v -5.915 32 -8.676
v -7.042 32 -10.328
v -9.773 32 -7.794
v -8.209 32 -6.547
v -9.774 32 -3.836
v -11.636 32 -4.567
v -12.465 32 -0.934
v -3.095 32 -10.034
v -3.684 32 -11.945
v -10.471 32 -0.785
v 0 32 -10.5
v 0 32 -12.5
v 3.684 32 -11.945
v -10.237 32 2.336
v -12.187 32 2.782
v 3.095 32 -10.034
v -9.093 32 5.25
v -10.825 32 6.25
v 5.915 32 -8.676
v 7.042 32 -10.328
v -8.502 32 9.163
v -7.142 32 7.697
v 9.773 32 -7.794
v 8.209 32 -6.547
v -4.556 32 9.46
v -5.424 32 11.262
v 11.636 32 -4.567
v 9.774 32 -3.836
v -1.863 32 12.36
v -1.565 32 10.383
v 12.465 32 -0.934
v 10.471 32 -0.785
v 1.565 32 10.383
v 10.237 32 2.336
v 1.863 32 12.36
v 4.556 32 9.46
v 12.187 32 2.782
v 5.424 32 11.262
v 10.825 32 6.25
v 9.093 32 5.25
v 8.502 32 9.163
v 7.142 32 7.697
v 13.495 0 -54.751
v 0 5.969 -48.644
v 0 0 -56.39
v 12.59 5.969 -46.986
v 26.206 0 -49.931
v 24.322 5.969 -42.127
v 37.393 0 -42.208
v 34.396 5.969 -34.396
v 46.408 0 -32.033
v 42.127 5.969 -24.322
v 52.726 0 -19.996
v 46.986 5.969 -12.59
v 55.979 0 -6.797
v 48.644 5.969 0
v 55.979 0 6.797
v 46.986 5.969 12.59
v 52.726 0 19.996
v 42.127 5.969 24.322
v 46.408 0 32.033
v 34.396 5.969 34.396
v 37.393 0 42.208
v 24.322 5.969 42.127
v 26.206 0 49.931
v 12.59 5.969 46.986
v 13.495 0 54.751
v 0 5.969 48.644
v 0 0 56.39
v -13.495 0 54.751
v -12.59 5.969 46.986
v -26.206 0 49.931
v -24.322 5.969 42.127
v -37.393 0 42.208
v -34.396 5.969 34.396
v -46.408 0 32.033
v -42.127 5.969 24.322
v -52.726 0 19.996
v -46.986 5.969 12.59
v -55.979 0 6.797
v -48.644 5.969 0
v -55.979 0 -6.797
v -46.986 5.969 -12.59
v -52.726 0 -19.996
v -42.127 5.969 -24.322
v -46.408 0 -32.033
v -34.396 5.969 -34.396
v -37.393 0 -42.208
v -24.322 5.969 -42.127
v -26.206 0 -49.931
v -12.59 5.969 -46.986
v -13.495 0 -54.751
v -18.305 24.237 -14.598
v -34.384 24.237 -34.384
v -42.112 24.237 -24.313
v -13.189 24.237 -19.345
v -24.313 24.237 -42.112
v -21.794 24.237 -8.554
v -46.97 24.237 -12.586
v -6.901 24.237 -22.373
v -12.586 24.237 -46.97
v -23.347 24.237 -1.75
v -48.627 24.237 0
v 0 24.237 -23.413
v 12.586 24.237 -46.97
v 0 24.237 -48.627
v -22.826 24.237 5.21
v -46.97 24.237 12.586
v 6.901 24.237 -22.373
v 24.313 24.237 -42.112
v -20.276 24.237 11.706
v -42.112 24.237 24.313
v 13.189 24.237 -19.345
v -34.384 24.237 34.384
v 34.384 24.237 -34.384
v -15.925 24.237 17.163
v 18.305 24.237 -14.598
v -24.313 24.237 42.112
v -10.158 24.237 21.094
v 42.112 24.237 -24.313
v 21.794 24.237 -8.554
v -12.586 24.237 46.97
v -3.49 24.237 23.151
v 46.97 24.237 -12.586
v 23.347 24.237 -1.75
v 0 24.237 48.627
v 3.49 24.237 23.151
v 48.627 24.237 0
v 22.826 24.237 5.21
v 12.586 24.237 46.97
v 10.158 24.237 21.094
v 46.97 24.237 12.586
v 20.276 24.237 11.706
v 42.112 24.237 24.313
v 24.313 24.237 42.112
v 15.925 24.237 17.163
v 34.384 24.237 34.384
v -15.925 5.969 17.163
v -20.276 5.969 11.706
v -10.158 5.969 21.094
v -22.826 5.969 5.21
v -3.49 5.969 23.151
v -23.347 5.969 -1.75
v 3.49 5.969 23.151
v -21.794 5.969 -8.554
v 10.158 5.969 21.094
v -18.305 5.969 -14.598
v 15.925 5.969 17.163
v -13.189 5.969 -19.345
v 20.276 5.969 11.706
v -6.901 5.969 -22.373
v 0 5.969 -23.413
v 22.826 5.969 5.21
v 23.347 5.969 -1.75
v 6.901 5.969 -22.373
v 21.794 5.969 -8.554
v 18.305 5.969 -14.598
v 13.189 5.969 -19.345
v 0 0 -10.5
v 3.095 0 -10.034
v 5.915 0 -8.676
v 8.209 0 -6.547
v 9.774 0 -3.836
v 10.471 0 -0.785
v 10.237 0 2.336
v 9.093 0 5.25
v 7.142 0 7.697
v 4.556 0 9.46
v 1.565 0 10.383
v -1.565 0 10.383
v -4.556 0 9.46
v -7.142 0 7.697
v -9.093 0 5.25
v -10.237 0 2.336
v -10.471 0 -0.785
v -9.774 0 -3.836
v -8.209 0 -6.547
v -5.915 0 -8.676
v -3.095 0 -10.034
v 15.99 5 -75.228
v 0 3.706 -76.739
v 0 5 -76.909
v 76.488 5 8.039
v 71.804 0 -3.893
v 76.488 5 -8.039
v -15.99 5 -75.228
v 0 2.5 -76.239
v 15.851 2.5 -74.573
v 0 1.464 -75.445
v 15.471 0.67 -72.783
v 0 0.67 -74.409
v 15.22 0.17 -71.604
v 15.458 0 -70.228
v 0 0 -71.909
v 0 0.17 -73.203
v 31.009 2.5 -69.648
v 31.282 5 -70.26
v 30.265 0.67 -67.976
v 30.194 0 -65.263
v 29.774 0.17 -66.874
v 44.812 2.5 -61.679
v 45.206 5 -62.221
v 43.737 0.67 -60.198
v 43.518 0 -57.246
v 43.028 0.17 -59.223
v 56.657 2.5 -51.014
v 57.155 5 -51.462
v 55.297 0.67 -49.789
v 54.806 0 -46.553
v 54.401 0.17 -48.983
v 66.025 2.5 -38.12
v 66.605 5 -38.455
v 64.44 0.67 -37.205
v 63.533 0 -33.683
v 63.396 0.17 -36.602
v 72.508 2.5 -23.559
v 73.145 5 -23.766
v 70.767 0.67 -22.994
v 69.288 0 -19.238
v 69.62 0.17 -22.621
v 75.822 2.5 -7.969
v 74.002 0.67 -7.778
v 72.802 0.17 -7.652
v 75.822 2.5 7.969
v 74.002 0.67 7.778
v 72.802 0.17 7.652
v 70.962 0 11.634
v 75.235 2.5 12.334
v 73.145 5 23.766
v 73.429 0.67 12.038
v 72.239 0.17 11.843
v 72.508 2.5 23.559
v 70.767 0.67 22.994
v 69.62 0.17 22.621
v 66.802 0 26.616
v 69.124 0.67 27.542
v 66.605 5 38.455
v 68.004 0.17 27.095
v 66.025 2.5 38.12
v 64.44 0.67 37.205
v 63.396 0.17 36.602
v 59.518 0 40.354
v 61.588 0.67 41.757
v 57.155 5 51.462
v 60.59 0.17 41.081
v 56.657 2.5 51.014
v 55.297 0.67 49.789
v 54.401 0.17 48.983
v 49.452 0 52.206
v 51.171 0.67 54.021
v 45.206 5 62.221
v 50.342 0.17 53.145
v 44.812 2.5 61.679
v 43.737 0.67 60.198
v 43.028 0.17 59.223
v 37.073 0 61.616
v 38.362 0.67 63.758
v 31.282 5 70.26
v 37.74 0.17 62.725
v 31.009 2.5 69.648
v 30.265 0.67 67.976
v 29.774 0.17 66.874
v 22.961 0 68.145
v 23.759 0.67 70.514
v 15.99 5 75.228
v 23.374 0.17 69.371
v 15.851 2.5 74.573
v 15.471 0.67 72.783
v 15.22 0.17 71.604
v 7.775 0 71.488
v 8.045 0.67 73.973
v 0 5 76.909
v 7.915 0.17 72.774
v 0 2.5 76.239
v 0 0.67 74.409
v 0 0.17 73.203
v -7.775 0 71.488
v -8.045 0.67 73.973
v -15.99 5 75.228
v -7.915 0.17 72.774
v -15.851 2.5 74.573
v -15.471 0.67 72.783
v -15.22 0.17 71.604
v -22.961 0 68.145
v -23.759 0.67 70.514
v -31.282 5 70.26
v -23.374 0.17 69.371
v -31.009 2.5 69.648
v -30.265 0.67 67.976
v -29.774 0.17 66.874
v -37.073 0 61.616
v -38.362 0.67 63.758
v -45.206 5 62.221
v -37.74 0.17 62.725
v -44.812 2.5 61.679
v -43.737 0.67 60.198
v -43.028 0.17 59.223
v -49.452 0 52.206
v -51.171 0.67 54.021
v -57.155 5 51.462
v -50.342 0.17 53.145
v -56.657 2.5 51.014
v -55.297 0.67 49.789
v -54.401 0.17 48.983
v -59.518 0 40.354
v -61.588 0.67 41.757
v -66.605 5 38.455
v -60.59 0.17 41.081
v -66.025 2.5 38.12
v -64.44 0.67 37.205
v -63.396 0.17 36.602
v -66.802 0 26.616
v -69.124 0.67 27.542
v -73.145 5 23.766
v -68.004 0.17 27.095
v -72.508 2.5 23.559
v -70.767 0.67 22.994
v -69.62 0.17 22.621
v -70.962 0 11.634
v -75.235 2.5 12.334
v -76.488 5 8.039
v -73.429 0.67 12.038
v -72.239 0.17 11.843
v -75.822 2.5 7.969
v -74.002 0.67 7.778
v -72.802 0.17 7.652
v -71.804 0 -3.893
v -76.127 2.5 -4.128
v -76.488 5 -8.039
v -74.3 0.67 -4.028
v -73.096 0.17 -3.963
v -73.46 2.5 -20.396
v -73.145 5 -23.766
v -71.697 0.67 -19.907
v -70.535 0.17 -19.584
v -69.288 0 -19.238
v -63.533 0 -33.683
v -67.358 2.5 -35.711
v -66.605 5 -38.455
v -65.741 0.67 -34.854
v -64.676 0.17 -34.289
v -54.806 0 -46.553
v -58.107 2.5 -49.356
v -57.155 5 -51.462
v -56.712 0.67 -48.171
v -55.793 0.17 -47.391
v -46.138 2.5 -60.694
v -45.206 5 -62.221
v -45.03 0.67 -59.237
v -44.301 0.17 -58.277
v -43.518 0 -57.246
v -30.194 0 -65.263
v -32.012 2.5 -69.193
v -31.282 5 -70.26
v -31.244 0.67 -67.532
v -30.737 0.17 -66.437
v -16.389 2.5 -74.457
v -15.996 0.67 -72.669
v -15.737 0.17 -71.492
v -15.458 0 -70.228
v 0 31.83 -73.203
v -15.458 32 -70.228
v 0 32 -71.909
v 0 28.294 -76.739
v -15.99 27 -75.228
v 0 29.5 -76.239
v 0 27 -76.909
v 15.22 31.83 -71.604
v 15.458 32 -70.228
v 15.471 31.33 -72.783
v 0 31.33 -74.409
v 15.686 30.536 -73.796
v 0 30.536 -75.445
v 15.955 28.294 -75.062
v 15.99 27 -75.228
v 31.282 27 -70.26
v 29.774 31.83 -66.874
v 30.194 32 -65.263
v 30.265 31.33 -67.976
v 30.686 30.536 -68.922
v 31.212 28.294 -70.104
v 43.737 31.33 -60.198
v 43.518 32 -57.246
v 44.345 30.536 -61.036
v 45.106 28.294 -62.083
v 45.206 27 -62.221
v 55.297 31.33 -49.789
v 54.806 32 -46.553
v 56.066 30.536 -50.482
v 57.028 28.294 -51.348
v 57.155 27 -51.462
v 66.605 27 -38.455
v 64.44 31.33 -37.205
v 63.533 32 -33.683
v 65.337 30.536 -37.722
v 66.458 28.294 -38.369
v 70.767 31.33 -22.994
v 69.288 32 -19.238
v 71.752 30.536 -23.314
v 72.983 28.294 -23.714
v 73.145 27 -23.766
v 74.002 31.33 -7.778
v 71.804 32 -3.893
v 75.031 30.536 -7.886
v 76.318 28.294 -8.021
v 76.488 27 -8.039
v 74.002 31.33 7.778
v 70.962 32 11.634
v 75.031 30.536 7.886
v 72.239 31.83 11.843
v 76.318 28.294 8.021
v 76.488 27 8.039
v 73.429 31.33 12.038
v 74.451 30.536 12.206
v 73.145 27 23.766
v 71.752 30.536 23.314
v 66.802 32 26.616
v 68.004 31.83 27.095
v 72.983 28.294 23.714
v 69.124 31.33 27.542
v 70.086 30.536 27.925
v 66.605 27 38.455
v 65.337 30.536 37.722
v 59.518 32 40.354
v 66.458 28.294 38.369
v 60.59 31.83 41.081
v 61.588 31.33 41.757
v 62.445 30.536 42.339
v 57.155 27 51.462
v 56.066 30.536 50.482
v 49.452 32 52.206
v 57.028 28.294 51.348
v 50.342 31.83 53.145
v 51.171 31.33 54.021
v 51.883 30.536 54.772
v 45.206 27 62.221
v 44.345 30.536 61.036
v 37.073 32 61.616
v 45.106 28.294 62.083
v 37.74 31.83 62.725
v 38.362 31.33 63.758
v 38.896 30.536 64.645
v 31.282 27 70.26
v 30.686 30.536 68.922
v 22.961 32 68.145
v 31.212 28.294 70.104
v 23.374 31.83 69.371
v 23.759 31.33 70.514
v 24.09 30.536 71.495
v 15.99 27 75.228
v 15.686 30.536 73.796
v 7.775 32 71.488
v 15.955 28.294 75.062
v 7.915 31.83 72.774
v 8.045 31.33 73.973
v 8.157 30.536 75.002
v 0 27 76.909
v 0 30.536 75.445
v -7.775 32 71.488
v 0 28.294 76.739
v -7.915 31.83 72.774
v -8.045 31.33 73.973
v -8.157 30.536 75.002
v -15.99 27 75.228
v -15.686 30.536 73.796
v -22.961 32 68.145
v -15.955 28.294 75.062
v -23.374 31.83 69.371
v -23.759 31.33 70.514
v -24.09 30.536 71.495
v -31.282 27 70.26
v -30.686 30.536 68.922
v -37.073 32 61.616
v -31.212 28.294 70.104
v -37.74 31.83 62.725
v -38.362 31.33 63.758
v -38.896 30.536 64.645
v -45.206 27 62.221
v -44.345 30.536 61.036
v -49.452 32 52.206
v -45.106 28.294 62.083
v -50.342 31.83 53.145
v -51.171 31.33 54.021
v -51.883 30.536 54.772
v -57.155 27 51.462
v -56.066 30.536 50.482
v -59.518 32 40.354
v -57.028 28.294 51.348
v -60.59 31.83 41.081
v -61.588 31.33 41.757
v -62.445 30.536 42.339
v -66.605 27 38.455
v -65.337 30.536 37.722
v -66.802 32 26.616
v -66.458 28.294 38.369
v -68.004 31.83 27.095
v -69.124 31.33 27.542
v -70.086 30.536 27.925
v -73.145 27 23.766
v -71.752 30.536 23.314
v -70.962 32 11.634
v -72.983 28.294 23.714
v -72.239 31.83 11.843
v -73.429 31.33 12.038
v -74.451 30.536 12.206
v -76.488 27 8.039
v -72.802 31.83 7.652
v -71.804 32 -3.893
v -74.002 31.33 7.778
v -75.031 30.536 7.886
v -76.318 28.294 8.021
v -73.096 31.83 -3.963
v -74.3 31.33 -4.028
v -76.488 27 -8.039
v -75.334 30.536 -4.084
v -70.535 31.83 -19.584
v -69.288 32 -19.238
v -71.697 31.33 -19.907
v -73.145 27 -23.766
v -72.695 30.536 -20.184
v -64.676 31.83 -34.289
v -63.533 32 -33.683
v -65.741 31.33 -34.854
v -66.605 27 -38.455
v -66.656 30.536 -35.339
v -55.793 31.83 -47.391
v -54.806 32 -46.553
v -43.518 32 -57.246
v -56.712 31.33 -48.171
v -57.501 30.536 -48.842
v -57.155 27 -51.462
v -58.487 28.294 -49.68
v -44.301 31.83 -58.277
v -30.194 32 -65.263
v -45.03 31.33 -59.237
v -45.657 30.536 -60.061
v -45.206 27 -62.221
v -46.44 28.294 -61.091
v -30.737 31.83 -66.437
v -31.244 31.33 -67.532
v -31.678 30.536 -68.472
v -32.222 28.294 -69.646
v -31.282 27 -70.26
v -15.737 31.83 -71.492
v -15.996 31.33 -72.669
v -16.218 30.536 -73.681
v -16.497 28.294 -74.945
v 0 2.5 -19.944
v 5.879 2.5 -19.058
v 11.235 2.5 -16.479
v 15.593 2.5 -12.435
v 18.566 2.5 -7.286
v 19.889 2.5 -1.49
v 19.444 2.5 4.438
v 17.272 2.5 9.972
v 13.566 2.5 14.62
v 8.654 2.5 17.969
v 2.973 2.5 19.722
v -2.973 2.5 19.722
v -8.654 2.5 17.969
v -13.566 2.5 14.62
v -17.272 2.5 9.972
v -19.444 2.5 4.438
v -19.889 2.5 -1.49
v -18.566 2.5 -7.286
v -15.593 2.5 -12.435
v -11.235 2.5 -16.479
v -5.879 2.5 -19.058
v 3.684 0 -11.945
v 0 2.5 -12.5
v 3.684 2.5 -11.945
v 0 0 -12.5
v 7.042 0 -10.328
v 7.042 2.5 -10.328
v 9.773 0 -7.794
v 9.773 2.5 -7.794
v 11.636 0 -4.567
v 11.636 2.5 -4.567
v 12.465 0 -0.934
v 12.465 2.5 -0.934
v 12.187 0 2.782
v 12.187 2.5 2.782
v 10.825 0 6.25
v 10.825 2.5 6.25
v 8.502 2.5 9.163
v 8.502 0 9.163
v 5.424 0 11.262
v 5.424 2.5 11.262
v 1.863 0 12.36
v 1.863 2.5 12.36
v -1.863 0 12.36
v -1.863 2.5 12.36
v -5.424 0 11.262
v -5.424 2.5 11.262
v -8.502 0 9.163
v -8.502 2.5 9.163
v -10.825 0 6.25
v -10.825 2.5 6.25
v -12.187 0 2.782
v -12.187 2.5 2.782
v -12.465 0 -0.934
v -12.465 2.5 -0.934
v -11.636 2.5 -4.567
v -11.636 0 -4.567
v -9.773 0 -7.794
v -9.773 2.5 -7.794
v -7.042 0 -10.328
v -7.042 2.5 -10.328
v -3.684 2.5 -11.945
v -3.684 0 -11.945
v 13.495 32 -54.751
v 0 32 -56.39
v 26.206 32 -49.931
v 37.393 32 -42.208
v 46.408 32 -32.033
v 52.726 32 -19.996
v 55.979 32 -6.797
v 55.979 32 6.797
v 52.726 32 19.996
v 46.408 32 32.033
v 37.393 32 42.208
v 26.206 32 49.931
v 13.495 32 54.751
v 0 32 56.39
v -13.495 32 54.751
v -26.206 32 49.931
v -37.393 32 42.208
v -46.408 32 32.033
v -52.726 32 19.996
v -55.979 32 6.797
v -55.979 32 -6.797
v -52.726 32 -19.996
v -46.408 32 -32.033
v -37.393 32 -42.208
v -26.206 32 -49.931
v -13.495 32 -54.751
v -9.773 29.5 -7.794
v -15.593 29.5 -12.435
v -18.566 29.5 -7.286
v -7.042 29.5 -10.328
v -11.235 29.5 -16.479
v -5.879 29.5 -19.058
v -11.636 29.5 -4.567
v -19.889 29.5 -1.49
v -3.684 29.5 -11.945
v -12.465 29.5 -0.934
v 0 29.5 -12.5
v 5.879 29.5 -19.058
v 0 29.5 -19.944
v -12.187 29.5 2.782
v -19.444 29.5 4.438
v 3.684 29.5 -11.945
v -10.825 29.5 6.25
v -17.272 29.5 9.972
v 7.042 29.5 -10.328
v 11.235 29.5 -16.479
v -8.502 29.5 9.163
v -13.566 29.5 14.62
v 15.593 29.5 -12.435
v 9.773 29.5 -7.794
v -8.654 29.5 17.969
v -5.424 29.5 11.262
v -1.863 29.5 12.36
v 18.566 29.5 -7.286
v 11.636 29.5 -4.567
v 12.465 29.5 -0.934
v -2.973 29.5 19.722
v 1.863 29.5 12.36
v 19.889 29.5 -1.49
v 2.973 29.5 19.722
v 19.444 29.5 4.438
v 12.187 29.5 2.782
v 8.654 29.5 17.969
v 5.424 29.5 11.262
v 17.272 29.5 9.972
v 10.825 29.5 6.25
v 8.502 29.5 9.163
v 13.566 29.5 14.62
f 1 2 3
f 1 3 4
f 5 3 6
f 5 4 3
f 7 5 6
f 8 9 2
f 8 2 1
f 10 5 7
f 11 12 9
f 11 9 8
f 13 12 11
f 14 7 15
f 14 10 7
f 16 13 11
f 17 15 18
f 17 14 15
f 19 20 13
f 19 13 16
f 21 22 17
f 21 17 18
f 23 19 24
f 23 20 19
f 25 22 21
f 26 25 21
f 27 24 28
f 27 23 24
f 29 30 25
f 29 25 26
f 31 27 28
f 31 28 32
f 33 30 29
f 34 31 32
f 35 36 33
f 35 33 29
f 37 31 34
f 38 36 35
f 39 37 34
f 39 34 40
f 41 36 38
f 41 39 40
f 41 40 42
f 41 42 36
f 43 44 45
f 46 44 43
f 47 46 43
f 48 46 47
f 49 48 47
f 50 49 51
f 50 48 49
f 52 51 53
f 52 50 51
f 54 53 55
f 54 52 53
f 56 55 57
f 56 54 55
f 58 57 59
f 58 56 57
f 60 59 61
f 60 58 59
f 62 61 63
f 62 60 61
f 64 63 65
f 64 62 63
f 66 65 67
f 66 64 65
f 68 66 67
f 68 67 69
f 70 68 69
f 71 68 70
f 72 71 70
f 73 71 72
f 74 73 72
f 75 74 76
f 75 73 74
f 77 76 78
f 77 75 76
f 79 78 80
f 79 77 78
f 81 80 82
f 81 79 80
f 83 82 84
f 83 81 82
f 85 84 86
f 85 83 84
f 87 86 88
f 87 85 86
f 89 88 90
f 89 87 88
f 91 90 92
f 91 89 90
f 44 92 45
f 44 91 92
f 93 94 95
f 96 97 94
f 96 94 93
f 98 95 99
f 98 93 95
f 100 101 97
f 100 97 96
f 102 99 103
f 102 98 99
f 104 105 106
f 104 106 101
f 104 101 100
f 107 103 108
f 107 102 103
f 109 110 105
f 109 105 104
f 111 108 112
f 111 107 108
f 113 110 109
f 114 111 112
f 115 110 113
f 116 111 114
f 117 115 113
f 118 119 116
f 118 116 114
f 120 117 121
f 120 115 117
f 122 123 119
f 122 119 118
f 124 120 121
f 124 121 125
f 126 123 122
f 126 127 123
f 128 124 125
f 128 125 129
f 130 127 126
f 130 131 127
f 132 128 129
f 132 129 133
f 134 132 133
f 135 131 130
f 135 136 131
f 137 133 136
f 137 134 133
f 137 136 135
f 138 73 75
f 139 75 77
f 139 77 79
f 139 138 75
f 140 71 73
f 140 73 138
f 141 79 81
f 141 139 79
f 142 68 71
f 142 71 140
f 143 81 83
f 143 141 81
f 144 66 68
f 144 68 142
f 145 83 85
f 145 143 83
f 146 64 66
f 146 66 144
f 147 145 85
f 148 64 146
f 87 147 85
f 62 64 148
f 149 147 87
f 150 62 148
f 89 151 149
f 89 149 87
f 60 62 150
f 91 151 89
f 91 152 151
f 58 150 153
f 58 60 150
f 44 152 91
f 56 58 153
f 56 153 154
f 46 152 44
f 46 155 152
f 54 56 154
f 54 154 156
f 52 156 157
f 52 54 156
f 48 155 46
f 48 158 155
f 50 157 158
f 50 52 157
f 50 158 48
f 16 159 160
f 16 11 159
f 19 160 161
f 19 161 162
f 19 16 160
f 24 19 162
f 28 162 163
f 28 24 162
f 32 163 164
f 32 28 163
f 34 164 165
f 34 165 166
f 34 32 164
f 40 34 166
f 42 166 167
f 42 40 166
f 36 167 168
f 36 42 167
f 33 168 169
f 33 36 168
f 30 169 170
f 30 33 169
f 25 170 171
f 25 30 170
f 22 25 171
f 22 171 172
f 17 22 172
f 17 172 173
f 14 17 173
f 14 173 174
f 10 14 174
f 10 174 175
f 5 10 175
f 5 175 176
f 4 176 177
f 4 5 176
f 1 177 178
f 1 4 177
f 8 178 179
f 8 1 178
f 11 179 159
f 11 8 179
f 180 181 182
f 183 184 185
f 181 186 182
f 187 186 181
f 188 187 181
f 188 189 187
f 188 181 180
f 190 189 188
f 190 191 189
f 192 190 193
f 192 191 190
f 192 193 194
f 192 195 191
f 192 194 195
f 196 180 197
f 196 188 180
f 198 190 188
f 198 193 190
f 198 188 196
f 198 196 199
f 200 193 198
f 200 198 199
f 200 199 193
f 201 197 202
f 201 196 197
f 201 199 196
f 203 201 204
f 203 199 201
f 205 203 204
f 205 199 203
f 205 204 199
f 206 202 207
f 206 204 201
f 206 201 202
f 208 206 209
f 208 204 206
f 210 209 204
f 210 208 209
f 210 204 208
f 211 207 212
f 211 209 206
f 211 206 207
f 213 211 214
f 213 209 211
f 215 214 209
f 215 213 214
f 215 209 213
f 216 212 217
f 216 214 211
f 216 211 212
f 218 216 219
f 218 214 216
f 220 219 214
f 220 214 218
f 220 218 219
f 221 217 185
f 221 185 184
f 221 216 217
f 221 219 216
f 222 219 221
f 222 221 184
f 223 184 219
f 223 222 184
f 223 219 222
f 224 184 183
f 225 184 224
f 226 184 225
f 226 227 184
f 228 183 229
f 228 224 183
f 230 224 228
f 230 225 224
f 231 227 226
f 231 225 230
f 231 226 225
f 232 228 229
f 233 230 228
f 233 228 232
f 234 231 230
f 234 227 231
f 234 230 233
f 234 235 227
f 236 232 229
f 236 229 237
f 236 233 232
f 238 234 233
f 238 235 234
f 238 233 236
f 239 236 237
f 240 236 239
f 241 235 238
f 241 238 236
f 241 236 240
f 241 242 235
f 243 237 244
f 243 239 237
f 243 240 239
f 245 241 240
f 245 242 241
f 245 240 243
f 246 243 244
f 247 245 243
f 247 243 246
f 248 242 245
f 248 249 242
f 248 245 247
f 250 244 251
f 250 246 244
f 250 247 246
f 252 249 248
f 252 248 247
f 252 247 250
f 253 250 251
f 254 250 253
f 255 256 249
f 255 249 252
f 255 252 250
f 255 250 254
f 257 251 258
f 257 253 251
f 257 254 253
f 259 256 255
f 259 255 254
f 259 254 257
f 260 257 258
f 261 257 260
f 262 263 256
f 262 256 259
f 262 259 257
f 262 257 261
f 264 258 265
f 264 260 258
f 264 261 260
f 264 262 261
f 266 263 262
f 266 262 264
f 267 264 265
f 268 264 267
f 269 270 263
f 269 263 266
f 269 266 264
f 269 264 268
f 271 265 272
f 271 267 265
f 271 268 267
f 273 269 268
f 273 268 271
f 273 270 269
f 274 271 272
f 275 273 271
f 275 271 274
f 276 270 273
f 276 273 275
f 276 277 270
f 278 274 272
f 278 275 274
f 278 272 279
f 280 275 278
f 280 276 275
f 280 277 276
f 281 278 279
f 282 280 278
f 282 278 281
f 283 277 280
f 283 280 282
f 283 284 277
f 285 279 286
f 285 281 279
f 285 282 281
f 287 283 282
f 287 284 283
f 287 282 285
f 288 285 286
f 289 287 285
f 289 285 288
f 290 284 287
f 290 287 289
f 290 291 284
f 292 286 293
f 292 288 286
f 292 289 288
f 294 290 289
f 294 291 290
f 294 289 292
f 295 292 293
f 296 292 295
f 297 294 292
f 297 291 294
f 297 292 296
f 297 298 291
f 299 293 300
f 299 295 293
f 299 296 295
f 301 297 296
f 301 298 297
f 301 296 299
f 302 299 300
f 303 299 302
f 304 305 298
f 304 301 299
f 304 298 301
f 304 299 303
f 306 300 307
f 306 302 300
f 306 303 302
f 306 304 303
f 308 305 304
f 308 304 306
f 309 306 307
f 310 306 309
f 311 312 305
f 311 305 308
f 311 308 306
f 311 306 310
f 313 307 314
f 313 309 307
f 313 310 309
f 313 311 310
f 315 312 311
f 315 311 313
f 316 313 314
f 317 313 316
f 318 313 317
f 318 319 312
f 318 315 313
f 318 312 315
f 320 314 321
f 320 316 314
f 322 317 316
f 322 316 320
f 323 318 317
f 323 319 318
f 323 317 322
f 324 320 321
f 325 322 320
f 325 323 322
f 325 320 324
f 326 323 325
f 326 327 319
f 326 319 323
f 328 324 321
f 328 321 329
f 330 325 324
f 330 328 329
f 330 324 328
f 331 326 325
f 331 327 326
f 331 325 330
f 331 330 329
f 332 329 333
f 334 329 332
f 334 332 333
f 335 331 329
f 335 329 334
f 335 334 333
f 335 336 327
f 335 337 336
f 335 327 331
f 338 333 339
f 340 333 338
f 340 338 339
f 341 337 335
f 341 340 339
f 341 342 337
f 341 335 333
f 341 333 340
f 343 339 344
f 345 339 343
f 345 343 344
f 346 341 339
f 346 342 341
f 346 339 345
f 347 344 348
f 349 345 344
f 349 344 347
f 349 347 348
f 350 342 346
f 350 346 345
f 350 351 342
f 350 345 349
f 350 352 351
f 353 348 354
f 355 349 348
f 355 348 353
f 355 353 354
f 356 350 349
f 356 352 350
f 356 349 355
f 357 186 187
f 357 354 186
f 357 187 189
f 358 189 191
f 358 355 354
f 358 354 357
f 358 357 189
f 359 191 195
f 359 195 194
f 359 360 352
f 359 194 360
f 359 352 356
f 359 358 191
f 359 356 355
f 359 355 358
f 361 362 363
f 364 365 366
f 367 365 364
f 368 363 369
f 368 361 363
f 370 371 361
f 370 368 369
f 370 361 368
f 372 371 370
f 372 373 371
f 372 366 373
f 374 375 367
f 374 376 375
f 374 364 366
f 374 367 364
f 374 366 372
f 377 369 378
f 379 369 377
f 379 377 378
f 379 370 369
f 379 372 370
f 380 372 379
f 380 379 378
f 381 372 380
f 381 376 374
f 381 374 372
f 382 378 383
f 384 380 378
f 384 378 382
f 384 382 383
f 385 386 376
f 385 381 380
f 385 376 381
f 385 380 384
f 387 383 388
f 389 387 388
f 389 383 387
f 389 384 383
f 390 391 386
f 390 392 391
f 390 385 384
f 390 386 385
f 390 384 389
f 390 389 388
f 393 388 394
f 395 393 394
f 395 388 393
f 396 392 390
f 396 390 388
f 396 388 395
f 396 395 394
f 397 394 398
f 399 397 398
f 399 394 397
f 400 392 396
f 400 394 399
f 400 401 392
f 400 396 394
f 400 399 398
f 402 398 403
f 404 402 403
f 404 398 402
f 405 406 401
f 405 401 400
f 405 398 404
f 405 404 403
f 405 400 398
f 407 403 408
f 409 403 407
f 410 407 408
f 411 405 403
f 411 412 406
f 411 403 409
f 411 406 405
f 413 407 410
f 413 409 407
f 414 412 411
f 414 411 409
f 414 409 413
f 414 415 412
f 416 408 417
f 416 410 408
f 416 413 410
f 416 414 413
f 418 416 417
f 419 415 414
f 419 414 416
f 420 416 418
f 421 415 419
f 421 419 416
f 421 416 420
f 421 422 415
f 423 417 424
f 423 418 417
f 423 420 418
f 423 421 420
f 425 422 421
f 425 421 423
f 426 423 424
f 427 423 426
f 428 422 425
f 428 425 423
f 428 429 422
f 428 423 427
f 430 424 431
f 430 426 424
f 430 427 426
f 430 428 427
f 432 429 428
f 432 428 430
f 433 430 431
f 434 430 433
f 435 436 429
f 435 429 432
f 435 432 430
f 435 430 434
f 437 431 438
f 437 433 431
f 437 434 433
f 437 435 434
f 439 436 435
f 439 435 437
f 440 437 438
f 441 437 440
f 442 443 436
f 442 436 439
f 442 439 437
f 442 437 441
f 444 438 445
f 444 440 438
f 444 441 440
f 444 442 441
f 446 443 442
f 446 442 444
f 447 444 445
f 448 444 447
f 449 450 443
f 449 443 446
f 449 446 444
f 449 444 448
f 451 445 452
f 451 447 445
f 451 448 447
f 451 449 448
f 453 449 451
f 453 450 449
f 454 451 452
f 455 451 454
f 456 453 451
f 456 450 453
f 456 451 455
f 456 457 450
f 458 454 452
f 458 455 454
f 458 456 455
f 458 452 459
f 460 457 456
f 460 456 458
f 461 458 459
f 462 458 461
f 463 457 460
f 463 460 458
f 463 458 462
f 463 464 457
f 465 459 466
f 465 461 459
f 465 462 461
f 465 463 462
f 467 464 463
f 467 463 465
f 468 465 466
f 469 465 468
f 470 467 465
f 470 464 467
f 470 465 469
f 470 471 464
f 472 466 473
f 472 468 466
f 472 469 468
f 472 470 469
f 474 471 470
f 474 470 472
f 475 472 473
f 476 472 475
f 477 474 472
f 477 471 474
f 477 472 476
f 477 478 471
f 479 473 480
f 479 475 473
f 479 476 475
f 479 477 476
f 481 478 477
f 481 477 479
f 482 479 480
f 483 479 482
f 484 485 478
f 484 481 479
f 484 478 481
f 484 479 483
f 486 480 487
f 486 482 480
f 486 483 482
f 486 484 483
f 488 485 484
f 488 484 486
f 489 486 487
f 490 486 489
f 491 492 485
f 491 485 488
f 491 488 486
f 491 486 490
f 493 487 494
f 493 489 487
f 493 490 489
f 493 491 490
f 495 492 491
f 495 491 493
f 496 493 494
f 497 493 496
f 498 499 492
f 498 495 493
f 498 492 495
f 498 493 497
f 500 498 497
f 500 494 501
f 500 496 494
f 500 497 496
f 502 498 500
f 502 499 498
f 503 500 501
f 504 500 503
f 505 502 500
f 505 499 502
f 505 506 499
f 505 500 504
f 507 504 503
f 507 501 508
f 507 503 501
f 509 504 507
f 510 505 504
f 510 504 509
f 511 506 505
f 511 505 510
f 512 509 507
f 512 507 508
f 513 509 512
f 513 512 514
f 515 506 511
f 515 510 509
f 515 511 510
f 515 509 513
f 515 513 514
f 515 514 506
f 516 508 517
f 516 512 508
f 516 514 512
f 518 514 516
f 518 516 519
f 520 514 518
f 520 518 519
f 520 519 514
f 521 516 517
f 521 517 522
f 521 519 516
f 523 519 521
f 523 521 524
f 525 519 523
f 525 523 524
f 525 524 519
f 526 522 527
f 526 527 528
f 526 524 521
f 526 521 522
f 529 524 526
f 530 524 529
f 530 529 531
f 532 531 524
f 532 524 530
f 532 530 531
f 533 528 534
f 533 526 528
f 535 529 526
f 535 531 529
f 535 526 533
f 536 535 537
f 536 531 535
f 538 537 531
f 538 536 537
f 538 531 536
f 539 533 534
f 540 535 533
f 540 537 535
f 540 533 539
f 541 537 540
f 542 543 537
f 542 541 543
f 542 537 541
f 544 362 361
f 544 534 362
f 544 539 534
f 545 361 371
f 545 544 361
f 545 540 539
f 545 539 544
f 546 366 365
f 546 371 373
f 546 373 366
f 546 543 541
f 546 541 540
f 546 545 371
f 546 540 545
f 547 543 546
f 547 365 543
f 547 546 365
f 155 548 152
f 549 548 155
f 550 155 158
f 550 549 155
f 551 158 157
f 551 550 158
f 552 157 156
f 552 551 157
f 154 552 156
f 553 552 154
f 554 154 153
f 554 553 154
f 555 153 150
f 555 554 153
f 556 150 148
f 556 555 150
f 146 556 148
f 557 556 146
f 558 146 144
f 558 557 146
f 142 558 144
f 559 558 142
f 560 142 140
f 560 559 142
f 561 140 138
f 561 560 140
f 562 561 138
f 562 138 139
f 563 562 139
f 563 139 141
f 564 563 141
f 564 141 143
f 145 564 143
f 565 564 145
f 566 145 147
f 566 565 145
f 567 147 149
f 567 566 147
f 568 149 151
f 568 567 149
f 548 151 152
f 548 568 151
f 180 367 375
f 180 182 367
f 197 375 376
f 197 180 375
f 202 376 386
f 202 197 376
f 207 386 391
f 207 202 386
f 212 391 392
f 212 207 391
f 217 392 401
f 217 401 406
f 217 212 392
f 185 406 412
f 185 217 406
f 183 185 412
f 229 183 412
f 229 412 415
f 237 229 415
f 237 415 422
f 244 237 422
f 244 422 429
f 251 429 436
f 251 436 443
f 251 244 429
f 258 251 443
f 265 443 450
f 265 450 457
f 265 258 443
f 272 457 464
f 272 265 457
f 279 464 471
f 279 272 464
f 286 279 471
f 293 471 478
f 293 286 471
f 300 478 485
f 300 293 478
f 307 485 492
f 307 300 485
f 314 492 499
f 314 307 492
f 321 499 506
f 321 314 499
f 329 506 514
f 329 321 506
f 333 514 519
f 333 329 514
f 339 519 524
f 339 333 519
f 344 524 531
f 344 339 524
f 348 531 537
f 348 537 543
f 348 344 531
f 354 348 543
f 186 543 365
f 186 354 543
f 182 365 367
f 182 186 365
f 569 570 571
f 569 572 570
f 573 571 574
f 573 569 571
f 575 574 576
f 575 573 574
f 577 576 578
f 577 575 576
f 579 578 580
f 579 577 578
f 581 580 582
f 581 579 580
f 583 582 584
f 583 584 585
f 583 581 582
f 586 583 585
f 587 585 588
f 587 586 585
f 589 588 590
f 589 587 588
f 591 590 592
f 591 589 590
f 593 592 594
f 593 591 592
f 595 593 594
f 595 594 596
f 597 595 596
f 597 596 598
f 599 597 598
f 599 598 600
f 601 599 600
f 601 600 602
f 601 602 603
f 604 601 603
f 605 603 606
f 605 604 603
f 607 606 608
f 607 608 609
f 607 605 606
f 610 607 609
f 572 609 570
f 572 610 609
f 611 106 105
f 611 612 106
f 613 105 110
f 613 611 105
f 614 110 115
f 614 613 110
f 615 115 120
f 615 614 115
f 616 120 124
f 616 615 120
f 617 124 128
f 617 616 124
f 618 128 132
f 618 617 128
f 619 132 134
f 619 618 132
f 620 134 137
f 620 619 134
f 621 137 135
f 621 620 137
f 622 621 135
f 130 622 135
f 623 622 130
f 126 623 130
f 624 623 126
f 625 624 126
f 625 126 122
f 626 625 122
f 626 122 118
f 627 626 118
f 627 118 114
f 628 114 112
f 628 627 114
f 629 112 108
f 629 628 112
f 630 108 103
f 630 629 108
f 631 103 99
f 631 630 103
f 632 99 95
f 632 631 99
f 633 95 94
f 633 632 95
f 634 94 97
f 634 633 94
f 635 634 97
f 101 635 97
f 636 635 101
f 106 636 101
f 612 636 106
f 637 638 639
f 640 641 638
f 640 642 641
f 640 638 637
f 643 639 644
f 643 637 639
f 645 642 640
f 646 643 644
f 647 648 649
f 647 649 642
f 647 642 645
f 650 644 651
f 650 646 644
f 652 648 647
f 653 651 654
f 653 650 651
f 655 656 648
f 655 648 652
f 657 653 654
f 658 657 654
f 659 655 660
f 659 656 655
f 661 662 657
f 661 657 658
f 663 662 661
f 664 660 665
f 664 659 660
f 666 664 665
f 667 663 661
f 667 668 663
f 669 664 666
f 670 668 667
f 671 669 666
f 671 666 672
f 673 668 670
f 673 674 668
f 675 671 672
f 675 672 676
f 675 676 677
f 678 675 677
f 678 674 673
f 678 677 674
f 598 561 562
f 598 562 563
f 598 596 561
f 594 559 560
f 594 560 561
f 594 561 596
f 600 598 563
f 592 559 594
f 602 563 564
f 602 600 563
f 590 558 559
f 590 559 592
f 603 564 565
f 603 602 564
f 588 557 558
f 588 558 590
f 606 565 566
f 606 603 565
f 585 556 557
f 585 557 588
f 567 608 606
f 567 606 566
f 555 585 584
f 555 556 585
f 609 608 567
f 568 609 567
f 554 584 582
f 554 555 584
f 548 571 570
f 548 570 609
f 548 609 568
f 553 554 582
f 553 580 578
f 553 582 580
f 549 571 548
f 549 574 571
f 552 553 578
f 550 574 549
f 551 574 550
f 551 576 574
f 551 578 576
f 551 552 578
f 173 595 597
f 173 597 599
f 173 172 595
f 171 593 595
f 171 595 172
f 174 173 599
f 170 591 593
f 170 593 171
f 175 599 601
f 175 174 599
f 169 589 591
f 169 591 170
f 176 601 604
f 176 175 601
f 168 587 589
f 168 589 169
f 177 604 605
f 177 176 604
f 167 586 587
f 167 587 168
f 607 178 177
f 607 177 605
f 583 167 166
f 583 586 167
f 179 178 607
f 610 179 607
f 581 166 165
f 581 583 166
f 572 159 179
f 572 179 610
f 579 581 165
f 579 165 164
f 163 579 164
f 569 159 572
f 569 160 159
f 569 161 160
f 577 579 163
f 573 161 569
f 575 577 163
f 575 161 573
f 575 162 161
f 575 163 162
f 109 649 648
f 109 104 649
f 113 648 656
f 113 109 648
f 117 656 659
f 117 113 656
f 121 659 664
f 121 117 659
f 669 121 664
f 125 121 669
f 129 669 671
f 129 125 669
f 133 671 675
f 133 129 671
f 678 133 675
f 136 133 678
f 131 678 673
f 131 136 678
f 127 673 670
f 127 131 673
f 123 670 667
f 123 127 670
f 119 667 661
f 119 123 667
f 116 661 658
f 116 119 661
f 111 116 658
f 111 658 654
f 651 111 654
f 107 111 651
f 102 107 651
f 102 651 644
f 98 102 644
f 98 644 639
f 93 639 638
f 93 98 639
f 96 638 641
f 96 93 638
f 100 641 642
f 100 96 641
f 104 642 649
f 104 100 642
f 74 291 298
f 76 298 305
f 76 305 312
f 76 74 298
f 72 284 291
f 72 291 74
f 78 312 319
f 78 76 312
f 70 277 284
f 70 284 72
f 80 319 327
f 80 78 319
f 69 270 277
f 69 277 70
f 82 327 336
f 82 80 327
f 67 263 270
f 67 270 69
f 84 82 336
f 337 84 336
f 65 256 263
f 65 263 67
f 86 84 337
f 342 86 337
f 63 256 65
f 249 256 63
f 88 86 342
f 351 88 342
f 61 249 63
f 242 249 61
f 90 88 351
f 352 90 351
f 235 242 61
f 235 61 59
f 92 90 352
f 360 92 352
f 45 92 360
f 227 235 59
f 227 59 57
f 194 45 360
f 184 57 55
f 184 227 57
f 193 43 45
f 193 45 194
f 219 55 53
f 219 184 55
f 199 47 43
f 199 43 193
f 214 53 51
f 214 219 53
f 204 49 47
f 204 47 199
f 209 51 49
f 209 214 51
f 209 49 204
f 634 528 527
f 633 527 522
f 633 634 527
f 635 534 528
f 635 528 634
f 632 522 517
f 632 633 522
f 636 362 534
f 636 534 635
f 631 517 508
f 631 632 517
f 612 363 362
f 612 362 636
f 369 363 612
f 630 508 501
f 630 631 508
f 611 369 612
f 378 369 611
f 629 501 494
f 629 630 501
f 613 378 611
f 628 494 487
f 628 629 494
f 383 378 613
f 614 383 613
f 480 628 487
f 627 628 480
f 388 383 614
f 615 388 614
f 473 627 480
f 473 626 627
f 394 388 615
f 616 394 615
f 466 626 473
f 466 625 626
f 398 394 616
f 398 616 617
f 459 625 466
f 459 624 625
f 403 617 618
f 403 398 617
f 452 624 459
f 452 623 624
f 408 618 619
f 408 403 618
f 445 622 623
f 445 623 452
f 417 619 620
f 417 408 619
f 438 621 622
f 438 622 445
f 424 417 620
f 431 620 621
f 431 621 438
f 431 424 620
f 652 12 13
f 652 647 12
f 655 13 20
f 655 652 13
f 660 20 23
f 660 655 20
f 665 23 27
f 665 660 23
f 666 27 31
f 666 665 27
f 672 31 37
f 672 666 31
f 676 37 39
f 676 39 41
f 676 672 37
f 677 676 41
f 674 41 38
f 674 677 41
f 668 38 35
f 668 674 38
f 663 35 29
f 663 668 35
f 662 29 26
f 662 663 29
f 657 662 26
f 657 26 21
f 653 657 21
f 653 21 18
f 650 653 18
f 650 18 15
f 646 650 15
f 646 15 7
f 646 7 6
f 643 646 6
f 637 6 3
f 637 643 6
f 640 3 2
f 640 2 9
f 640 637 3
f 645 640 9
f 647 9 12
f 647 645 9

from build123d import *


with BuildPart() as part:
    # Эскиз2 → Повернуть1 (revolve)
    with BuildSketch(Plane(origin=(0, 0, 0), x_dir=(0, 0, -1), z_dir=(1, 0, 0))):
        with BuildLine():
            Line((10.5, 0), (10.5, 32))
            Line((10.5, 32), (12.5, 32))
            Line((12.5, 32), (12.5, 29.5))
            Line((12.5, 29.5), (19.944344329, 29.5))
            Line((19.944344329, 29.5), (23.412925951, 24.236876385))
            Line((23.412925951, 24.236876385), (48.626846206, 24.236876385))
            Line((48.626846206, 24.236876385), (56.389969821, 32))
            Line((56.389969821, 32), (71.909127128, 32))
            ThreePointArc((71.909127128, 32), (75.444661033, 30.535533906), (76.909127128, 27))
            Line((76.909127128, 27), (76.909127128, 5))
            ThreePointArc((76.909127128, 5), (75.444661033, 1.464466094), (71.909127128, 0))
            Line((71.909127128, 0), (56.389969821, 0))
            Line((56.389969821, 0), (48.643821993, 5.968581622))
            Line((48.643821993, 5.968581622), (23.412925951, 5.968581622))
            Line((23.412925951, 5.968581622), (19.944344329, 2.5))
            Line((19.944344329, 2.5), (12.5, 2.5))
            Line((12.5, 2.5), (12.5, 0))
            Line((12.5, 0), (10.5, 0))
        make_face()
    revolve(axis=Axis((0, 76.584186447, 0), (0, -1, 0)))


solid = part.part
